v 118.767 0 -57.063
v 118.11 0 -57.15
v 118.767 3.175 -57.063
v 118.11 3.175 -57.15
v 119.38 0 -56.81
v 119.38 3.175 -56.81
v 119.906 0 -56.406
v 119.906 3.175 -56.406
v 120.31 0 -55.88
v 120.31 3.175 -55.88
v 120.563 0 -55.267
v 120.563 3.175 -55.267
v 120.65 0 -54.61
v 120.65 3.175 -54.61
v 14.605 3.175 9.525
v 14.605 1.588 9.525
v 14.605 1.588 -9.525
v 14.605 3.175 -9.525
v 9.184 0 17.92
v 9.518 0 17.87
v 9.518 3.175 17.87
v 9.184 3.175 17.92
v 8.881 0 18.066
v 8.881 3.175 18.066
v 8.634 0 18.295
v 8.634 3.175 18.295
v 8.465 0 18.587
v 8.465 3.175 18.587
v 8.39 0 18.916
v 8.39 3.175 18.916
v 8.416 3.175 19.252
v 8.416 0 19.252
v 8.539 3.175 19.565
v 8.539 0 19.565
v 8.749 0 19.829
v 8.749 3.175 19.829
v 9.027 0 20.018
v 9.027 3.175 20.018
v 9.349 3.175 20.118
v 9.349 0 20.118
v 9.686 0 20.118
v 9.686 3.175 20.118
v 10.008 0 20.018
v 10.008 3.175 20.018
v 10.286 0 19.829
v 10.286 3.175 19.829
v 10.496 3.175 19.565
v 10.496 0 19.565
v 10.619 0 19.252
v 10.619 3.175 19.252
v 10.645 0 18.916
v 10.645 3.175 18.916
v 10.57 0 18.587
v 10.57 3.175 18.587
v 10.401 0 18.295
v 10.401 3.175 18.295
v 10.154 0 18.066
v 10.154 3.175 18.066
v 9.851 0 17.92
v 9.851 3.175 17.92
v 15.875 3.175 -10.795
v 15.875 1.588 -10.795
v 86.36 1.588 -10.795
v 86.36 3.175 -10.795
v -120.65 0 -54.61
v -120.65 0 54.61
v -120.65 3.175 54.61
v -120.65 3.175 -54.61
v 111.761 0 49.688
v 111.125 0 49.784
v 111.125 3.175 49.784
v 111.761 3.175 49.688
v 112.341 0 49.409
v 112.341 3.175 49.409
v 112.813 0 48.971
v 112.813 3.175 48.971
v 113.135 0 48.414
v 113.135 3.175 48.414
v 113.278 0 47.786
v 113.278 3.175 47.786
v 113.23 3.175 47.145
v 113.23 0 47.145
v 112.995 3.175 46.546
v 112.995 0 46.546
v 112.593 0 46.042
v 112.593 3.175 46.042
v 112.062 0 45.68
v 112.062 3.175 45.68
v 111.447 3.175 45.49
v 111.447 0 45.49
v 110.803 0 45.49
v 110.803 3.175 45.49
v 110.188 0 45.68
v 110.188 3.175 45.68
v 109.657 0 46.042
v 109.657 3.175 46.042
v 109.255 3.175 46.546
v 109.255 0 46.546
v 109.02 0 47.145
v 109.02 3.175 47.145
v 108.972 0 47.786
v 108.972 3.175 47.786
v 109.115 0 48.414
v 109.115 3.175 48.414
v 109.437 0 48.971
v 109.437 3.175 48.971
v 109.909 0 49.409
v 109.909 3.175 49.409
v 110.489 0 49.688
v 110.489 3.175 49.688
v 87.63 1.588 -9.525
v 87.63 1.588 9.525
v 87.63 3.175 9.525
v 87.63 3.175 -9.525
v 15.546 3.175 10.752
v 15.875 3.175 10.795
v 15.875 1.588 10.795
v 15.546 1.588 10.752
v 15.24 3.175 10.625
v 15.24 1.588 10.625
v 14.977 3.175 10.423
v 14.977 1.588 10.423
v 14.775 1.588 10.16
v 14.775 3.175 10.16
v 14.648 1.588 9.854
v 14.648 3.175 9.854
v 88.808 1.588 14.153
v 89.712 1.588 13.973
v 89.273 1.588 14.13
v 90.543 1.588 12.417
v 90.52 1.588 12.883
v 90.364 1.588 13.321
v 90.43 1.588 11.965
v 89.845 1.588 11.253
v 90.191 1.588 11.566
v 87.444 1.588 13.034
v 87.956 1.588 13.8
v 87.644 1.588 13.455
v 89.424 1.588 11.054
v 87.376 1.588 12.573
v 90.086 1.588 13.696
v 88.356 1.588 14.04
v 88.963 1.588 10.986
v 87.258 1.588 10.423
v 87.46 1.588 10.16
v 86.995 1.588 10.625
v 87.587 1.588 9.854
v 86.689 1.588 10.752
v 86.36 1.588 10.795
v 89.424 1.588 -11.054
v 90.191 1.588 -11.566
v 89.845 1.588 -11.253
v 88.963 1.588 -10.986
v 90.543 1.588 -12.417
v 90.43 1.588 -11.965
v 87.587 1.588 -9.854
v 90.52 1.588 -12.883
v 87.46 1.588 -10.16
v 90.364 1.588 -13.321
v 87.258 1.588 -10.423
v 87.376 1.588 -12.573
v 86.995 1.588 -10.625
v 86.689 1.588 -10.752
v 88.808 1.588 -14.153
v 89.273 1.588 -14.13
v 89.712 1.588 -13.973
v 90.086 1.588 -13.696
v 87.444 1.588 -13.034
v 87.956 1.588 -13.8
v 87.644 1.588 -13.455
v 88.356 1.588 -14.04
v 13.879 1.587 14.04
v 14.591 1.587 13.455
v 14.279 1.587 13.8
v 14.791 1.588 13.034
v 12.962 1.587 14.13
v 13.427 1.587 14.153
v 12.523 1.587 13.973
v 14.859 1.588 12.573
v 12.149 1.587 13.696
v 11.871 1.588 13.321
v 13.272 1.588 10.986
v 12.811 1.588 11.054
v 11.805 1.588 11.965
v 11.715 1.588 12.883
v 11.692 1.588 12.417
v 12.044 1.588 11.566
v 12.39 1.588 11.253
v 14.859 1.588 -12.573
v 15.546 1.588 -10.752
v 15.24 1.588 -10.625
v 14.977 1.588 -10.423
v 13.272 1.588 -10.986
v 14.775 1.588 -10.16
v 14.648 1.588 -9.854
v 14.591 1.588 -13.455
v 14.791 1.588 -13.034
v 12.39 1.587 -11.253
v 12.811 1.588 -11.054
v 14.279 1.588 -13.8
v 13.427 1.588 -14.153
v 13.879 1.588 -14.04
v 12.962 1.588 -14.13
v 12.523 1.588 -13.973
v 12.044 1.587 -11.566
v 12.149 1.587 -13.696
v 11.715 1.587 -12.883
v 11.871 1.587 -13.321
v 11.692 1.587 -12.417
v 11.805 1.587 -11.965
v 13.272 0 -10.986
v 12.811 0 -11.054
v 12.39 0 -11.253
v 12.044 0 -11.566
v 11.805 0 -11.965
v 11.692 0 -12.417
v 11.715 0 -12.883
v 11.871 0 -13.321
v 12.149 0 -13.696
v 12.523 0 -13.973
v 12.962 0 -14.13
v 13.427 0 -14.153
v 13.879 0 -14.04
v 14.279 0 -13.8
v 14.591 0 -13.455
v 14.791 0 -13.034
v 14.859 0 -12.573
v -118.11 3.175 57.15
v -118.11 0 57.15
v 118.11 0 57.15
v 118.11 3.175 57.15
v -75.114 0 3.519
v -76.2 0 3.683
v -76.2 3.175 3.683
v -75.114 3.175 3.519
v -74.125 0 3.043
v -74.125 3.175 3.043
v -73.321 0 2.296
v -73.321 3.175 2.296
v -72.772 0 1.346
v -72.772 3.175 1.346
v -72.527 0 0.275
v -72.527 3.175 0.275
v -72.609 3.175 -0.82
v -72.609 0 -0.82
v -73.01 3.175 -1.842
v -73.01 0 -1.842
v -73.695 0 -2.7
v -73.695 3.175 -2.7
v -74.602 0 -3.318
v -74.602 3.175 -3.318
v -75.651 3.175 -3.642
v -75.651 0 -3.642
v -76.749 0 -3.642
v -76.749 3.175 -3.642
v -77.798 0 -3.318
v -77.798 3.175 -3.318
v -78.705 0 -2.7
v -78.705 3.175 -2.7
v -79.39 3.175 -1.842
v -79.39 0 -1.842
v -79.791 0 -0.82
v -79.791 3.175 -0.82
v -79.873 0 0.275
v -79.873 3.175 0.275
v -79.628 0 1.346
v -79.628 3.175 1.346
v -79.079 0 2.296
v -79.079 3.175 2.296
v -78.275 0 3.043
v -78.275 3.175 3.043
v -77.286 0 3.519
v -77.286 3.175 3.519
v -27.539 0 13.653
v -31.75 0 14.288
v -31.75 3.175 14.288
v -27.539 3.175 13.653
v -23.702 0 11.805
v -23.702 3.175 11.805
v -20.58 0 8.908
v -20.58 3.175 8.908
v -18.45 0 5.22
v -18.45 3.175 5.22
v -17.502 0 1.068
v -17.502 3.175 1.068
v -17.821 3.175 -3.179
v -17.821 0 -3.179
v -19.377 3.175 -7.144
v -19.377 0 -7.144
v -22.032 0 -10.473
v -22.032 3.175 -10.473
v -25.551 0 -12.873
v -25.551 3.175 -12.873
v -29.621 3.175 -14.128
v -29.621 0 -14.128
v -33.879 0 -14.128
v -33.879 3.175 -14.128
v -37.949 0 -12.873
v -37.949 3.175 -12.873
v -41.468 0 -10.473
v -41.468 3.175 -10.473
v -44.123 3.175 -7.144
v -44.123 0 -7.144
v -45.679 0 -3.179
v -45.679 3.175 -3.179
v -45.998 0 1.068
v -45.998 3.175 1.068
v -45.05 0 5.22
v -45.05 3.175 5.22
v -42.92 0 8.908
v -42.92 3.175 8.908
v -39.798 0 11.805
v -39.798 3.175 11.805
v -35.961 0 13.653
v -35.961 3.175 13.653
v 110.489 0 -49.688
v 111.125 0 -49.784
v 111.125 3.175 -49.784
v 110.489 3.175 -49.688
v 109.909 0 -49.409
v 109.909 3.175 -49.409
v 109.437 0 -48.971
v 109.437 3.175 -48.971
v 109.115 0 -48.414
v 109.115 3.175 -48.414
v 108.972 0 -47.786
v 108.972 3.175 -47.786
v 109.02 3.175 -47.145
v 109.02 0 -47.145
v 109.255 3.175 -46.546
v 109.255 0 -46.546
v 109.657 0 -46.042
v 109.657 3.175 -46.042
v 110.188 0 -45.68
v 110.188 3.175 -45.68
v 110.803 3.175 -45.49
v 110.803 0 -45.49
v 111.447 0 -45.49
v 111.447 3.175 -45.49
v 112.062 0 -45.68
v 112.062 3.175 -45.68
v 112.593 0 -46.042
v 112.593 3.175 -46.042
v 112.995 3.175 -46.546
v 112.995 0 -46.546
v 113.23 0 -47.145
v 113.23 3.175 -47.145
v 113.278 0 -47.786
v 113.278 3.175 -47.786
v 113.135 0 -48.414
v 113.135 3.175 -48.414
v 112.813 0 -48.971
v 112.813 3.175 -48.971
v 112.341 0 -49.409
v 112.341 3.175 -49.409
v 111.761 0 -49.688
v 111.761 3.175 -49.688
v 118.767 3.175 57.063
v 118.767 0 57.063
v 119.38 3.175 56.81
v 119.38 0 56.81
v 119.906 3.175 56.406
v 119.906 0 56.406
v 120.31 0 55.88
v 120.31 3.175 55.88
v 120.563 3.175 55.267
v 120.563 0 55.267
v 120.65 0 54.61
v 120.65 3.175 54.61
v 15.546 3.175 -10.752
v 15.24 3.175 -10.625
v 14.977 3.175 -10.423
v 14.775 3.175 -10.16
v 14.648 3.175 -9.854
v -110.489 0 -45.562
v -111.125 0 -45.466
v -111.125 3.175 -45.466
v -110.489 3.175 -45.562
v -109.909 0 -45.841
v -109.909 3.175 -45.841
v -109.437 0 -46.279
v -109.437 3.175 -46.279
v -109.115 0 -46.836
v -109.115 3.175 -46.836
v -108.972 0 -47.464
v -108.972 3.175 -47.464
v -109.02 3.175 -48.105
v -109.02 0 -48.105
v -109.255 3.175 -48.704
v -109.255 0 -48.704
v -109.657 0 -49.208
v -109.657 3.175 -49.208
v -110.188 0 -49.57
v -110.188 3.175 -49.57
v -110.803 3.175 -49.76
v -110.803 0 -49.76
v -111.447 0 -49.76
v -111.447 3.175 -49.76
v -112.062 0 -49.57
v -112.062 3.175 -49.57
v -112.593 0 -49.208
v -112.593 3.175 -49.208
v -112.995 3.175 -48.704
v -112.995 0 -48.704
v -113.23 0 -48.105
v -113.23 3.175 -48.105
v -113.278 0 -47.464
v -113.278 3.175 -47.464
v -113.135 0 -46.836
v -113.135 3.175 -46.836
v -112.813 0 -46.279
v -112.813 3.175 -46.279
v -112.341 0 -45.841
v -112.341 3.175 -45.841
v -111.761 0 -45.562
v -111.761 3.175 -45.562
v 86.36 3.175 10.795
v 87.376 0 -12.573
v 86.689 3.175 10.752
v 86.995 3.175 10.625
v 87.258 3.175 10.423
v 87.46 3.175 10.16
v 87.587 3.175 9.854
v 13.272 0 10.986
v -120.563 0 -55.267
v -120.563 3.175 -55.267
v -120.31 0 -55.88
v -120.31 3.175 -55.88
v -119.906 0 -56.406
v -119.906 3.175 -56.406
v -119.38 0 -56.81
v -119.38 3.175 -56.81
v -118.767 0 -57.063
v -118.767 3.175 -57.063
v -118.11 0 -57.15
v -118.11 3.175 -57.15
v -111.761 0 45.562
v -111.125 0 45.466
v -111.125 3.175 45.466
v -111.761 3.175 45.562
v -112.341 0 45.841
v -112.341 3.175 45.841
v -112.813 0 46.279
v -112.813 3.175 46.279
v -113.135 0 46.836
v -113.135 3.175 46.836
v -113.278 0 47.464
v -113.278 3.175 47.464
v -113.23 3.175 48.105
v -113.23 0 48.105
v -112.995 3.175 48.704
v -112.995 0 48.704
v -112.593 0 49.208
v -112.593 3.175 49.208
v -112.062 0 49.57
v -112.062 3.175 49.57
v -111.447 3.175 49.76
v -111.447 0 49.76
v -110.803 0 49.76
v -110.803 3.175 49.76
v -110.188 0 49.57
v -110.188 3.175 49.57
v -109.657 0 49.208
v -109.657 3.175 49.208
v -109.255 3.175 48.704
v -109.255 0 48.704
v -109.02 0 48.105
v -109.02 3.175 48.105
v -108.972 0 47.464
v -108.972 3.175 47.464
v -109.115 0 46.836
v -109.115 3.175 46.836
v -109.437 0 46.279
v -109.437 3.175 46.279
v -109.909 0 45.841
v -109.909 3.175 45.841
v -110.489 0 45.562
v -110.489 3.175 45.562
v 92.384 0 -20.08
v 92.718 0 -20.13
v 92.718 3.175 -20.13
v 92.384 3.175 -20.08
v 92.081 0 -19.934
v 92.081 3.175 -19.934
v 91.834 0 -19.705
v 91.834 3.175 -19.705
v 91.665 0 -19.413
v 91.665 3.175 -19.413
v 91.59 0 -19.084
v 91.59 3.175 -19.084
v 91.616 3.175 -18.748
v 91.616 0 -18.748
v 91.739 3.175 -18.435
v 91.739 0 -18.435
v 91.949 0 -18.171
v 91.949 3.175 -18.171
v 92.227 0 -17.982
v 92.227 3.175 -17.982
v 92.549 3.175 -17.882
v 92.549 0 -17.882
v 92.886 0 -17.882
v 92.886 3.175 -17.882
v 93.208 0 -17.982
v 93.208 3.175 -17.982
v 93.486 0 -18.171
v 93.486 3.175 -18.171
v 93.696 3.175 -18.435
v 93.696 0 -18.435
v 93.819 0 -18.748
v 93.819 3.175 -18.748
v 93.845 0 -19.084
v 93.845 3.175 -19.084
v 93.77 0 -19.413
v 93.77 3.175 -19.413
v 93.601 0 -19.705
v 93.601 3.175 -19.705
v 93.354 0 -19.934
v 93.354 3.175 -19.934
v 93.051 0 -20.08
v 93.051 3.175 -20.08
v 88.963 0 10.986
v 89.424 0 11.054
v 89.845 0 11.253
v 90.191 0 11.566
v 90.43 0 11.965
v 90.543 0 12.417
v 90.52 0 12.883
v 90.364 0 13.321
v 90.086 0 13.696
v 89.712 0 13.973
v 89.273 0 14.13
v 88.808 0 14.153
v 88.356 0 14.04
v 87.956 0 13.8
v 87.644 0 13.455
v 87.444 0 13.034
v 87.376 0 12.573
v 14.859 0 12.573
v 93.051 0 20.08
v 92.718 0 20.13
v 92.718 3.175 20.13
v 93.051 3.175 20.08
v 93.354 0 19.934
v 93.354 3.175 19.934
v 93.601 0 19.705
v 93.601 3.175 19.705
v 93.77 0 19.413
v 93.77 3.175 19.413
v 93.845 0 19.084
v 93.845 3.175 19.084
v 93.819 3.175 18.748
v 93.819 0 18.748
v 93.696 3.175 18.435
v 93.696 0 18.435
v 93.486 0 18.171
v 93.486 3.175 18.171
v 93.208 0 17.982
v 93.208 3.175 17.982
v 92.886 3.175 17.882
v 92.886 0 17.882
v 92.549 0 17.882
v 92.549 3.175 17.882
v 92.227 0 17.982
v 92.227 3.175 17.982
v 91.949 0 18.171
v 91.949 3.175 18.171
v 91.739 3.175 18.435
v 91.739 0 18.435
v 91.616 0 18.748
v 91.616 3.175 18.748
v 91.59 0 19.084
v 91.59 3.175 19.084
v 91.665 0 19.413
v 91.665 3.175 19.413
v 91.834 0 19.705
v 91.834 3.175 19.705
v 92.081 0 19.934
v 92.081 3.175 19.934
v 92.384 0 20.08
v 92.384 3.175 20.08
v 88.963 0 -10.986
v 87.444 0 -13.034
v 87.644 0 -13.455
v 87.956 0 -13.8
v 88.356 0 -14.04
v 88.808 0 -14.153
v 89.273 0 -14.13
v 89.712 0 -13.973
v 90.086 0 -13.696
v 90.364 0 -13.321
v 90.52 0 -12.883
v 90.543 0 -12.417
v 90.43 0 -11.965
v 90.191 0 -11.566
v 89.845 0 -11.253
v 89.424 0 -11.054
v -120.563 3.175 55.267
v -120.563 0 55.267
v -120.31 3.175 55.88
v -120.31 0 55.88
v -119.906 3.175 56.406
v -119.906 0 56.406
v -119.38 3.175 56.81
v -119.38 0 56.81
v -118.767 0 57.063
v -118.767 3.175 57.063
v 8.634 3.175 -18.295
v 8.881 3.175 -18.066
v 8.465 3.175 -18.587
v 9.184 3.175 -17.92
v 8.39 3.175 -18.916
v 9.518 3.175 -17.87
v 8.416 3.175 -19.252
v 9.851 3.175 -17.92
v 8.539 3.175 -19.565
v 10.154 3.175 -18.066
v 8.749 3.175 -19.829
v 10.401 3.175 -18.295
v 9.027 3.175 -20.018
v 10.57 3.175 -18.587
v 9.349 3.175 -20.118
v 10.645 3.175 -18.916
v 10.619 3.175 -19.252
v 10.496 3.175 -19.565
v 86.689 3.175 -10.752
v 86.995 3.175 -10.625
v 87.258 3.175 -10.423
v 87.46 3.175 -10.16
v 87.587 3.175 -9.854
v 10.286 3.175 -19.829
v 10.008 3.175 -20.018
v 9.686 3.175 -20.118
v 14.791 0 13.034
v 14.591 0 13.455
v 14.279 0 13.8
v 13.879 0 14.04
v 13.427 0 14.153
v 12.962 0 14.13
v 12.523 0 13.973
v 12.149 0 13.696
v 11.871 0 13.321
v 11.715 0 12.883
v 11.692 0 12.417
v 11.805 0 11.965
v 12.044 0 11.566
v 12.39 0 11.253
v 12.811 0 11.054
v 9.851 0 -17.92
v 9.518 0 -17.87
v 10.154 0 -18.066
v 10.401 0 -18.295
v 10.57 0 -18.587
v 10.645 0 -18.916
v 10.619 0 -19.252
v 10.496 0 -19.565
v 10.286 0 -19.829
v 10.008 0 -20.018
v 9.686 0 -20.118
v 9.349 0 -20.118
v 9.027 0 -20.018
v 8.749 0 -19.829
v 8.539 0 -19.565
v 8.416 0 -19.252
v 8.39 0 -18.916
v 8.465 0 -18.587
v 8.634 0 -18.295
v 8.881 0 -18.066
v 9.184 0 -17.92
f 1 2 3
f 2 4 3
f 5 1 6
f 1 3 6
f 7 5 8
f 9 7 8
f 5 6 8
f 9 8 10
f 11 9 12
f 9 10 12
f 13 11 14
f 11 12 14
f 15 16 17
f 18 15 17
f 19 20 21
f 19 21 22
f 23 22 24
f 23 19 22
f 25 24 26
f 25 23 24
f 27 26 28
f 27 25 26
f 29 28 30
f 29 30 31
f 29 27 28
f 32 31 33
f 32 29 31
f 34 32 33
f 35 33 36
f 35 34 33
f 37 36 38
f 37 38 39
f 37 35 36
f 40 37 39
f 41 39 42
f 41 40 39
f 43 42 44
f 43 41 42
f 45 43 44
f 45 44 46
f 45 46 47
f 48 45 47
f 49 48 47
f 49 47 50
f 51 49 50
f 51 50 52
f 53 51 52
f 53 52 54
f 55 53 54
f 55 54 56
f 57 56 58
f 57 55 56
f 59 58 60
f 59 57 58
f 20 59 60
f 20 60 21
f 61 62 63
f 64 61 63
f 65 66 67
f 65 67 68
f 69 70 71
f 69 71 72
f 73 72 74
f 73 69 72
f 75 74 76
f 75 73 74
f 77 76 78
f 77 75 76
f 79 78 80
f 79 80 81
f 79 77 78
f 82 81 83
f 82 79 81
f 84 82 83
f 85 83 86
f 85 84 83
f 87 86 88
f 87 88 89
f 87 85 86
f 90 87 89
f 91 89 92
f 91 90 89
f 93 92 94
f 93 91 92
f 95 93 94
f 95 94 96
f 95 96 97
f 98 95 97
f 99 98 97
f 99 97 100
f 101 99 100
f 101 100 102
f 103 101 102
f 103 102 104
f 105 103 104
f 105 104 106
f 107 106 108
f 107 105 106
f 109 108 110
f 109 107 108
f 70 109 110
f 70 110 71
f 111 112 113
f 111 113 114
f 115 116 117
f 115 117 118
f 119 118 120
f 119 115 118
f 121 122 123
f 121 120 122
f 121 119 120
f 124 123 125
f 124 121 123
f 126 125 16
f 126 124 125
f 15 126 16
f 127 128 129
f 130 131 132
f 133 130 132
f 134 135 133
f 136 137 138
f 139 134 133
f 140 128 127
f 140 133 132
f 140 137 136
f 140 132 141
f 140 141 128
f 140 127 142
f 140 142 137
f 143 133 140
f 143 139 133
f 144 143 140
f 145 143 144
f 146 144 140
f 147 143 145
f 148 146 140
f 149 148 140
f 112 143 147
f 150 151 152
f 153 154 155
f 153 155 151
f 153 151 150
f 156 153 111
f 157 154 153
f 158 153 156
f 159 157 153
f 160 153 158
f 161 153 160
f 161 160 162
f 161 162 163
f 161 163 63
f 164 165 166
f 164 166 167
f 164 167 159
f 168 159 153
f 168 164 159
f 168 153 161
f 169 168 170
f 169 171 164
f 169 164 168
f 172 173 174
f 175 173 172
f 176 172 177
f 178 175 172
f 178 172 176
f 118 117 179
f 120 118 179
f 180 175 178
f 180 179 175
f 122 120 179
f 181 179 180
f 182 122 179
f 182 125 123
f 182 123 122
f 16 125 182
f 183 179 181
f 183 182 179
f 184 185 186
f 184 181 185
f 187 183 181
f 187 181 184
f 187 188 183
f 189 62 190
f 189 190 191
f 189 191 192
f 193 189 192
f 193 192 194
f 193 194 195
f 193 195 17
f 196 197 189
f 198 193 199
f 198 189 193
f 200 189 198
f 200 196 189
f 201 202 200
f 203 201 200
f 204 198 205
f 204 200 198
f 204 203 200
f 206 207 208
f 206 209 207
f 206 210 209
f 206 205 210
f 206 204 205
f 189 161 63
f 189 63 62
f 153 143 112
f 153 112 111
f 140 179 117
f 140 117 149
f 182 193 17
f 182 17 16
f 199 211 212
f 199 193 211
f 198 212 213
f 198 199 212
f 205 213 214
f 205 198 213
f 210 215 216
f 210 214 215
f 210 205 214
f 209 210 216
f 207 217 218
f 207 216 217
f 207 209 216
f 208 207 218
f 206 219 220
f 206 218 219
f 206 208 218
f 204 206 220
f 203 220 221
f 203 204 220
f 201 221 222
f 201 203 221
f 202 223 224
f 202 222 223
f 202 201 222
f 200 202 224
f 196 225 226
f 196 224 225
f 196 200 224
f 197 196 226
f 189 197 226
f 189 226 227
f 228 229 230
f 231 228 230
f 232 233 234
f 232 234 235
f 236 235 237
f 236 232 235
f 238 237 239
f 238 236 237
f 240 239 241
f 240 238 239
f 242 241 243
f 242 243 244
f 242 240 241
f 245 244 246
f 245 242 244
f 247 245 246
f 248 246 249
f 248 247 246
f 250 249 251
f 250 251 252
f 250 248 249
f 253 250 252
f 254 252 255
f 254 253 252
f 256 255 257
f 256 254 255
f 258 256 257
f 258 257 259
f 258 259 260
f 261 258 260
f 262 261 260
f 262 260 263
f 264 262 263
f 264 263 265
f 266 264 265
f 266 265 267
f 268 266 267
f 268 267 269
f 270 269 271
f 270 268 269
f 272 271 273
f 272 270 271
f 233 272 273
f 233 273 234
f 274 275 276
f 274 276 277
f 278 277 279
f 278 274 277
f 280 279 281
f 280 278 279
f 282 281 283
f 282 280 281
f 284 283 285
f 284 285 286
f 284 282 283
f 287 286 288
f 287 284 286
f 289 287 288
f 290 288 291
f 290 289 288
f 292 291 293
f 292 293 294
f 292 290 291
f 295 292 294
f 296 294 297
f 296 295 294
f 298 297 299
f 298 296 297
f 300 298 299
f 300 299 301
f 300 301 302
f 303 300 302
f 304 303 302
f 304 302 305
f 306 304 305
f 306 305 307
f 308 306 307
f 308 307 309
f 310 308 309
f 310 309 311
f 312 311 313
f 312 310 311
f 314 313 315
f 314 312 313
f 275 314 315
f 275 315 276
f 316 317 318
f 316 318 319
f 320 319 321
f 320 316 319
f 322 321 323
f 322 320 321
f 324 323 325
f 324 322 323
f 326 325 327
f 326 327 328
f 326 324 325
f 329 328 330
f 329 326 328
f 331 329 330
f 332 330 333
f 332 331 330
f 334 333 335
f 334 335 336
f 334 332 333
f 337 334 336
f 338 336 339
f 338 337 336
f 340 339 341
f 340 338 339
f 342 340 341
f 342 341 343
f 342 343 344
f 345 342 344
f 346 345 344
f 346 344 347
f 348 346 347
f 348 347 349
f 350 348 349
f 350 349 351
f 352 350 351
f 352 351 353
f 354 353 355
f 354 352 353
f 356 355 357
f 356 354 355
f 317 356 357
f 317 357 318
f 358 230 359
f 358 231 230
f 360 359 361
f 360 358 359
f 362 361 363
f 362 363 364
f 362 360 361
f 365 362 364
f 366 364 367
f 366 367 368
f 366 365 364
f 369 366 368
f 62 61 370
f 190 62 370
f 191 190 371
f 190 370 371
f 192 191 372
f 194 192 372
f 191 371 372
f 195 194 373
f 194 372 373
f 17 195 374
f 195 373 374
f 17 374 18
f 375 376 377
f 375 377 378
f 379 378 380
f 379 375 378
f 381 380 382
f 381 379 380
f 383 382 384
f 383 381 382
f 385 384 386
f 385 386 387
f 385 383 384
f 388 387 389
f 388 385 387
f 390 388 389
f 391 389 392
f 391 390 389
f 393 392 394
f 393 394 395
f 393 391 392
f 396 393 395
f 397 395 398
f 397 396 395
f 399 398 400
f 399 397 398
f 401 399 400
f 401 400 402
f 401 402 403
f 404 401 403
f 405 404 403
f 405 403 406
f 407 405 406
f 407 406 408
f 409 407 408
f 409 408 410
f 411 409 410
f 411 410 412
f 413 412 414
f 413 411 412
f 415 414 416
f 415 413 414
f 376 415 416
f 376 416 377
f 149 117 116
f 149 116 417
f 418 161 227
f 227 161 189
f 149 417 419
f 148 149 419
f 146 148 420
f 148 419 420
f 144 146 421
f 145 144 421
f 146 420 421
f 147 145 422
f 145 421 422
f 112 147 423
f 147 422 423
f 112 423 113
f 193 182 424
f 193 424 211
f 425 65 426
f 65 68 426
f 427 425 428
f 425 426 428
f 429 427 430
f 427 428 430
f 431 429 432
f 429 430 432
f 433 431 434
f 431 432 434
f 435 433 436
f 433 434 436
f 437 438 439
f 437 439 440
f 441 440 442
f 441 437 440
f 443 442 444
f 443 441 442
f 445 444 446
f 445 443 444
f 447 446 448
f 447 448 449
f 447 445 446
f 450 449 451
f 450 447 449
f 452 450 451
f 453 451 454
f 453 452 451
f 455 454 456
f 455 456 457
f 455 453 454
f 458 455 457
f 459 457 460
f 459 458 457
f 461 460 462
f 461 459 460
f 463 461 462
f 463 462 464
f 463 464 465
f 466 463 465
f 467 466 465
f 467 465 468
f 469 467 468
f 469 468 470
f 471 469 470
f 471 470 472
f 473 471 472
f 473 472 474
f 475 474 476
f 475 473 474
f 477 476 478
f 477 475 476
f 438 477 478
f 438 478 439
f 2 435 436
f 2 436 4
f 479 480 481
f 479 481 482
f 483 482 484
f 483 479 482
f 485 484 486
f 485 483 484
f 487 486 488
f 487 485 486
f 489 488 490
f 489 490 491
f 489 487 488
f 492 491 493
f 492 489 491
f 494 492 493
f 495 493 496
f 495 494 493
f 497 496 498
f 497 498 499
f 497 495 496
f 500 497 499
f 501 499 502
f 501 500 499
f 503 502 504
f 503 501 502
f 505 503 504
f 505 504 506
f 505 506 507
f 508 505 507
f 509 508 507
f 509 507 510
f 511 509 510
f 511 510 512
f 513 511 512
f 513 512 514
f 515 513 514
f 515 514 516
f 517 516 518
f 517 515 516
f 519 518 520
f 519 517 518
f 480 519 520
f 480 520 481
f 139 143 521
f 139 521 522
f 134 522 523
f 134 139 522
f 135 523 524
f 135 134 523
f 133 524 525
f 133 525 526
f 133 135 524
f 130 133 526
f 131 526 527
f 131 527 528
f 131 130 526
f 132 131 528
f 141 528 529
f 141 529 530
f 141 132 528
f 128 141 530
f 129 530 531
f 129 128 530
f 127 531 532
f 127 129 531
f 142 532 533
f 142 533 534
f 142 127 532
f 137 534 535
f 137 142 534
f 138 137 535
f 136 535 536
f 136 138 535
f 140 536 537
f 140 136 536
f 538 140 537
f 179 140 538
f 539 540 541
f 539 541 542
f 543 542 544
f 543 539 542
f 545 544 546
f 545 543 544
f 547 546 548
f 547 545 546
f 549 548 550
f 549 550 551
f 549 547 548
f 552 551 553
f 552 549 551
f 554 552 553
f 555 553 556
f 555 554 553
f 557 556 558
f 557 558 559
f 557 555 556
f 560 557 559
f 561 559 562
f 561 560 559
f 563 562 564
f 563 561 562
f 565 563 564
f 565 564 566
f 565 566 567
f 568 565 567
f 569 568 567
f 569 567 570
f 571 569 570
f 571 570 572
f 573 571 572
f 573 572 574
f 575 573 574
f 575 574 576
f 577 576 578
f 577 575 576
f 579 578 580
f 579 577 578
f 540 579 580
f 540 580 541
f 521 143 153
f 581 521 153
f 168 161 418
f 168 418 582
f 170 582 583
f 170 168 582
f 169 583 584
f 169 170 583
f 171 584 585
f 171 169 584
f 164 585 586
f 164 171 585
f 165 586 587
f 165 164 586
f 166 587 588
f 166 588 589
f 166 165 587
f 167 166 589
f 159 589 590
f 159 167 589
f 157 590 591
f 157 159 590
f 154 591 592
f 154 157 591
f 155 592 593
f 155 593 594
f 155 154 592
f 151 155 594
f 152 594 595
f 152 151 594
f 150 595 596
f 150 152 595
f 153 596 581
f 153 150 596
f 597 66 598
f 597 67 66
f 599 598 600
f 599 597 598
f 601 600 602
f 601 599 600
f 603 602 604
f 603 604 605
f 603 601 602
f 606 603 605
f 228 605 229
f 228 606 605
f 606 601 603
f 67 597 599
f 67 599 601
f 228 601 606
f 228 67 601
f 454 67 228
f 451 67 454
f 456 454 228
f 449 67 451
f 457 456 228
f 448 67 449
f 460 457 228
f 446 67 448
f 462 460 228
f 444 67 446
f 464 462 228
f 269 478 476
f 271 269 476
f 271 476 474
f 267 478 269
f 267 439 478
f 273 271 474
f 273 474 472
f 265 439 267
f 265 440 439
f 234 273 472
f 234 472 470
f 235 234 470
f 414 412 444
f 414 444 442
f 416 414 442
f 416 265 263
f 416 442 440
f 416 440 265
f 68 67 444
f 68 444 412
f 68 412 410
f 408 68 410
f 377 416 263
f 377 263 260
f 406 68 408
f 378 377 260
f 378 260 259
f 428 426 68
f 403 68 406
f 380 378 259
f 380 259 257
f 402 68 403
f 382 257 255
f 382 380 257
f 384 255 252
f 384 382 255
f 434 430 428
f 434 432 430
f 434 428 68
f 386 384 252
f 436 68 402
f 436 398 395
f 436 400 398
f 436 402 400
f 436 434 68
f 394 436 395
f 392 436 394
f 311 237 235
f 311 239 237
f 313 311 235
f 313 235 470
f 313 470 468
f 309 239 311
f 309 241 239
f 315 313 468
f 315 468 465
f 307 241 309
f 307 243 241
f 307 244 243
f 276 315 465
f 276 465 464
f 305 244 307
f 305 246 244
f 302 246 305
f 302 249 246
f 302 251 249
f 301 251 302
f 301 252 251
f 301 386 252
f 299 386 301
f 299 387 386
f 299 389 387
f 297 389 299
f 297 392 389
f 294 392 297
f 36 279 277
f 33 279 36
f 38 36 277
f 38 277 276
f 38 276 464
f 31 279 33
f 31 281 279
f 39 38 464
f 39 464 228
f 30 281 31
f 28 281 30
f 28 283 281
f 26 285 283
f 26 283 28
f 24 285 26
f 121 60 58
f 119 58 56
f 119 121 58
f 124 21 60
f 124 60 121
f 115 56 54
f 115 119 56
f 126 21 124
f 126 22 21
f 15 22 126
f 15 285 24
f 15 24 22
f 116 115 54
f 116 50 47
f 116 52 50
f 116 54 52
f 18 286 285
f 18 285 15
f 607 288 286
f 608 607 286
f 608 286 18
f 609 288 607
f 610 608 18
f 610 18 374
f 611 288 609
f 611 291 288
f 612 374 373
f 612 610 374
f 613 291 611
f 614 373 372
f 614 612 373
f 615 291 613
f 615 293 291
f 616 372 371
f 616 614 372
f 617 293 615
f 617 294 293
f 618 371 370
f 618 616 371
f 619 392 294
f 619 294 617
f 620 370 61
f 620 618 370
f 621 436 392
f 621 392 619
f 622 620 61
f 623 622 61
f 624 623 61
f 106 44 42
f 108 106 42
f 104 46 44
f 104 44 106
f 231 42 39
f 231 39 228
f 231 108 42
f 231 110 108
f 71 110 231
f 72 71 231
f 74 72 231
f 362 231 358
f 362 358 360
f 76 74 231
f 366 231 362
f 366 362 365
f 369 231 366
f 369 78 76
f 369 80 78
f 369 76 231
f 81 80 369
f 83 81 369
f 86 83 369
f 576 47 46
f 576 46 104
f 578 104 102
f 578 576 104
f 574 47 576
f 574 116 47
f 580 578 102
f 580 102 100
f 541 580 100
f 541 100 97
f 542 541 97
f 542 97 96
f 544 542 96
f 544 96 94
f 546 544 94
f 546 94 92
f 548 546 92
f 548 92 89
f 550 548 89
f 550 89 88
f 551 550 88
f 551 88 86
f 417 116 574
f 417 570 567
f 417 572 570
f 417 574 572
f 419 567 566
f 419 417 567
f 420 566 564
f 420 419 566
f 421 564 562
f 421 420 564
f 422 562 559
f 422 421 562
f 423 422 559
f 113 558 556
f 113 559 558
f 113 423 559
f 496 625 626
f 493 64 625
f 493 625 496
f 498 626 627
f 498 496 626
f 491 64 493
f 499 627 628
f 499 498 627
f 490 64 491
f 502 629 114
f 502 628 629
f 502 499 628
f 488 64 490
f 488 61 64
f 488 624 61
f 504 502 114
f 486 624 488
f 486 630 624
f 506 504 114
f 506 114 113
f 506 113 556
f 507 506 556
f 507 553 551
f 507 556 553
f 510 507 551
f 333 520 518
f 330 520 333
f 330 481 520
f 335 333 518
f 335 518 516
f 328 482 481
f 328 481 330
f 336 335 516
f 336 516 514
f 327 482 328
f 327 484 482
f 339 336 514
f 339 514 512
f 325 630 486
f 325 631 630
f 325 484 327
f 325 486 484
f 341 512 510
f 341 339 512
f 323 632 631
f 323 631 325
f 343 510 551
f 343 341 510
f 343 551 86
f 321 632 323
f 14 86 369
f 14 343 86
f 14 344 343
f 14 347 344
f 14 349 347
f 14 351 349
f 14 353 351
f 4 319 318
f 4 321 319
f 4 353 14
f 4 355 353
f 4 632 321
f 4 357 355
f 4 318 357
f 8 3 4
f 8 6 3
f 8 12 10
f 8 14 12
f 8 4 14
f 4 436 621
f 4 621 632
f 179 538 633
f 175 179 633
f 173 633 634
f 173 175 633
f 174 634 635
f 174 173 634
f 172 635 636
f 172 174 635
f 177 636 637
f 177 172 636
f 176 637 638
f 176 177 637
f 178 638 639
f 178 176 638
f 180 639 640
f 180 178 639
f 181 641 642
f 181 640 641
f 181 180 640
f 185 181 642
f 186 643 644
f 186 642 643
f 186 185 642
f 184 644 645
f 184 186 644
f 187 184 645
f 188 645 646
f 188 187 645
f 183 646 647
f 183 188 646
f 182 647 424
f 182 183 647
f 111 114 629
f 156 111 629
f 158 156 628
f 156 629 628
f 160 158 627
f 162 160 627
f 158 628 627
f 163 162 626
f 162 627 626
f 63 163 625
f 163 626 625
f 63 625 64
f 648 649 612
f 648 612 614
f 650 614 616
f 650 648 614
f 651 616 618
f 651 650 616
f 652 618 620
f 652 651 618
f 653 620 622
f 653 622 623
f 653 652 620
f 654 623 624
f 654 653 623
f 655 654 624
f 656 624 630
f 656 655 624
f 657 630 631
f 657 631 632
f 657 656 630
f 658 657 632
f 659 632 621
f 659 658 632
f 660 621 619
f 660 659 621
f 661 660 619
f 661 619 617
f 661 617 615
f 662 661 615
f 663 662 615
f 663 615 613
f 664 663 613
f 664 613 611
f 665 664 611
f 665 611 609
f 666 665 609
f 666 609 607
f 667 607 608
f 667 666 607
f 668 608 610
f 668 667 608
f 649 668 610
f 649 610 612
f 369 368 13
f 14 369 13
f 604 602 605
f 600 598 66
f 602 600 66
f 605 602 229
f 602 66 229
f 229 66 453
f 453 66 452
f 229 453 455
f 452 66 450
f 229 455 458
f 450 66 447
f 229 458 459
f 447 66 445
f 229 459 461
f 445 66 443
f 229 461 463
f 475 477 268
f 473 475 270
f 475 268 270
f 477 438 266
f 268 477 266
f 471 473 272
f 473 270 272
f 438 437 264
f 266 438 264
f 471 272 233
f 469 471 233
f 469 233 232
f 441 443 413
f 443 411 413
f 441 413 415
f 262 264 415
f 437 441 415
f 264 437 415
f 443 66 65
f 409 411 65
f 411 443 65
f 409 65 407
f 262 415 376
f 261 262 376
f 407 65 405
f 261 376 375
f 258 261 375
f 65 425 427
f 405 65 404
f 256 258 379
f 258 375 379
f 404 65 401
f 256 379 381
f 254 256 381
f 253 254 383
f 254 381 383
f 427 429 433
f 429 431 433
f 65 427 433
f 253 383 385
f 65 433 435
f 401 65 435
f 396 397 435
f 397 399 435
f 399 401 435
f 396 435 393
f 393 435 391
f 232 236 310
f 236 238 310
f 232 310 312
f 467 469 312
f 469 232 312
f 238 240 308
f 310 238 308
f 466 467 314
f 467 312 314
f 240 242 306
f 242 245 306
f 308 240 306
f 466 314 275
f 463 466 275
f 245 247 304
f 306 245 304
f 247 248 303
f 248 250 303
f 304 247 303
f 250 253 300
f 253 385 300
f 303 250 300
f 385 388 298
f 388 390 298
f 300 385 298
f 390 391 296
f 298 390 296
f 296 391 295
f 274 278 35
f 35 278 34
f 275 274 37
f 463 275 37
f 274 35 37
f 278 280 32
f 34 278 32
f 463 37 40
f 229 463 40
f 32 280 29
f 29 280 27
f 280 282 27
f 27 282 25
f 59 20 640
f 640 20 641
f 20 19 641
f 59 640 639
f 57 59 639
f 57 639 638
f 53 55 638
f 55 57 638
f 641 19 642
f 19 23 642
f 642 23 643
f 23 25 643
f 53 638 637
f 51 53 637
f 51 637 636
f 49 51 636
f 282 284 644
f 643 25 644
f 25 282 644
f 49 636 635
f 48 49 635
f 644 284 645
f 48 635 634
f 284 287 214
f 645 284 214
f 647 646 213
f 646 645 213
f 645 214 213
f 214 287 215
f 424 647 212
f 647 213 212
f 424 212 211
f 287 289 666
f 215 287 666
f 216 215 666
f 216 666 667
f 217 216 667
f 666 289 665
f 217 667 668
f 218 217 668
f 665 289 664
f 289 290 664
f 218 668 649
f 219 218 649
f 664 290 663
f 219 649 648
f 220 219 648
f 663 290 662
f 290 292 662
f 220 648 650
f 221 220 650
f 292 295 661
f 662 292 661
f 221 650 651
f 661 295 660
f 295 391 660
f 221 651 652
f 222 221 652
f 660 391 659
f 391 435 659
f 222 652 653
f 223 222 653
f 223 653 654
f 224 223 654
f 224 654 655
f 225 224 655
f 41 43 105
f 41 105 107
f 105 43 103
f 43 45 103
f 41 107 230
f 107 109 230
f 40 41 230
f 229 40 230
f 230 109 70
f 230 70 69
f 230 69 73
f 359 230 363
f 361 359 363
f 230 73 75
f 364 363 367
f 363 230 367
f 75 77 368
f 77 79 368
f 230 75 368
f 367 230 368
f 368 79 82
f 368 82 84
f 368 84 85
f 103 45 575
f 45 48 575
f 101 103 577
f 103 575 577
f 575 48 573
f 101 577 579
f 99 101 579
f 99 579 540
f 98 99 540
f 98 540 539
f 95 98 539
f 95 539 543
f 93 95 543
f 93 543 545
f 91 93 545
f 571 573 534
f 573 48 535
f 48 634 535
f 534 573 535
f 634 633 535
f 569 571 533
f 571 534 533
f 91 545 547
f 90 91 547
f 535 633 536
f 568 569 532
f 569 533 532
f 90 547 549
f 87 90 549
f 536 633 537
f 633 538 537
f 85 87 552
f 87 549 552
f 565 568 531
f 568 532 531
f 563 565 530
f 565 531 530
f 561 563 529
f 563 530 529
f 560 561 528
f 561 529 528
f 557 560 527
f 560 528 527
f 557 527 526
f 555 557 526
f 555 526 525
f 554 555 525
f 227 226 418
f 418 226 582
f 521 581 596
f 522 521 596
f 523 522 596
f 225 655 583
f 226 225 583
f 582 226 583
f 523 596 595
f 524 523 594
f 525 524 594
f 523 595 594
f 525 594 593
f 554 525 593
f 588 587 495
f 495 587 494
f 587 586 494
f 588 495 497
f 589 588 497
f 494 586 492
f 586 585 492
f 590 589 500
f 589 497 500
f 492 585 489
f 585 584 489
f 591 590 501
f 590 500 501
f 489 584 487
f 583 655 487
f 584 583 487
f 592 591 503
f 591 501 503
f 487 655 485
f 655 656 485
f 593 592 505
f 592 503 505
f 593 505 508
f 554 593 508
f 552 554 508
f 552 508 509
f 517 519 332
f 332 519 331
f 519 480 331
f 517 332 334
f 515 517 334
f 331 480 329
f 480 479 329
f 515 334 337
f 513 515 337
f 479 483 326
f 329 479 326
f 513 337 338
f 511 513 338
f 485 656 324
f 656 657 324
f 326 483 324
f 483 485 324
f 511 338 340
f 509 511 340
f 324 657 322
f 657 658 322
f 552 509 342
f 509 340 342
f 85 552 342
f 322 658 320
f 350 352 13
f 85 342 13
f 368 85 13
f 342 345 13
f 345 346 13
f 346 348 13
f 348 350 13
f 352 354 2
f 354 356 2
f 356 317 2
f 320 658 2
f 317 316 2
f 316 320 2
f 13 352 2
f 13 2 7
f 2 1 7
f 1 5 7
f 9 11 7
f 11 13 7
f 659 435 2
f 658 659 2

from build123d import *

# Parameters (mm, degrees)
SKETCH1_W           = 241.3
SKETCH1_H           = 114.3
SKETCH1_R           = 2.159
SKETCH1_R_2         = 3.683
SKETCH1_R_3         = 14.2875
SKETCH1_R_4         = 1.1303
SKETCH1_W_2         = 73.025
SKETCH1_H_2         = 21.59
BOSS_EXTRUDE1_DEPTH = 3.175
FILLET1_R           = 1.27
FILLET2_R           = 2.54
CUT_EXTRUDE1_START  = -1.5875
SKETCH2_R           = 1.5875
SKETCH2_W           = 75.692
SKETCH2_H           = 25.146
CUT_EXTRUDE1_DEPTH  = 1.5875


with BuildPart() as part:
    # Sketch1 → Boss-Extrude1 (new body)
    with BuildSketch(Plane(origin=(0, 0, 0), x_dir=(1, 0, 0), z_dir=(0, 1, 0))):
        Rectangle(SKETCH1_W, SKETCH1_H)
        with Locations(Location((-111.125, 47.625, 0), (0, 0, 270))):
            Circle(SKETCH1_R, mode=Mode.SUBTRACT)
        with Locations(Location((111.125, 47.625, 0), (0, 0, 90))):
            Circle(SKETCH1_R, mode=Mode.SUBTRACT)
        with Locations(Location((111.125, -47.625, 0), (0, 0, 270))):
            Circle(SKETCH1_R, mode=Mode.SUBTRACT)
        with Locations(Location((-111.125, -47.625, 0), (0, 0, 90))):
            Circle(SKETCH1_R, mode=Mode.SUBTRACT)
        with Locations(Location((-76.2, 0, 0), (0, 0, 270))):
            Circle(SKETCH1_R_2, mode=Mode.SUBTRACT)
        with Locations(Location((-31.75, 0, 0), (0, 0, 270))):
            Circle(SKETCH1_R_3, mode=Mode.SUBTRACT)
        with Locations(Location((9.5175, 19, 0), (0, 0, 270))):
            Circle(SKETCH1_R_4, mode=Mode.SUBTRACT)
        with Locations(Location((9.5175, -19, 0), (0, 0, 90))):
            Circle(SKETCH1_R_4, mode=Mode.SUBTRACT)
        with Locations(Location((92.7175, -19, 0), (0, 0, 270))):
            Circle(SKETCH1_R_4, mode=Mode.SUBTRACT)
        with Locations(Location((92.7175, 19, 0), (0, 0, 90))):
            Circle(SKETCH1_R_4, mode=Mode.SUBTRACT)
        with Locations((51.1175, 0)):
            Rectangle(SKETCH1_W_2, SKETCH1_H_2, mode=Mode.SUBTRACT)
    extrude(amount=BOSS_EXTRUDE1_DEPTH)

    # Fillet1
    fillet1_edges = [part.edges().sort_by_distance(p)[0] for p in [
        (87.63, 1.5875, 10.795),
        (87.63, 1.5875, -10.795),
        (14.605, 1.5875, -10.795),
        (14.605, 1.5875, 10.795),
    ]]
    fillet(fillet1_edges, radius=FILLET1_R)

    # Fillet2
    fillet2_edges = [part.edges().sort_by_distance(p)[0] for p in [
        (120.65, 1.5875, 57.15),
        (-120.65, 1.5875, 57.15),
        (-120.65, 1.5875, -57.15),
        (120.65, 1.5875, -57.15),
    ]]
    fillet(fillet2_edges, radius=FILLET2_R)

    # Sketch2 → Cut-Extrude1 (cut)
    # profile 1 of 21: a face of its own
    with BuildSketch(Plane(origin=(0, 0, 0), x_dir=(-1, 0, 0), z_dir=(0, -1, 0)).offset(CUT_EXTRUDE1_START)):
        with Locations((-13.2715, 12.573)):
            Circle(SKETCH2_R)
    # profile 2 of 21: a face of its own
    with BuildSketch(Plane(origin=(0, 0, 0), x_dir=(-1, 0, 0), z_dir=(0, -1, 0)).offset(CUT_EXTRUDE1_START)):
        with Locations((-88.9635, 12.573)):
            Circle(SKETCH2_R)
    # profile 3 of 21: a face of its own
    with BuildSketch(Plane(origin=(0, 0, 0), x_dir=(-1, 0, 0), z_dir=(0, -1, 0)).offset(CUT_EXTRUDE1_START)):
        with Locations((-88.9635, -12.573)):
            Circle(SKETCH2_R)
    # profile 4 of 21: a face of its own
    with BuildSketch(Plane(origin=(0, 0, 0), x_dir=(-1, 0, 0), z_dir=(0, -1, 0)).offset(CUT_EXTRUDE1_START)):
        with Locations((-13.2715, -12.573)):
            Circle(SKETCH2_R)
    # profile 5 of 21: a face of its own
    with BuildSketch(Plane(origin=(0, 0, 0), x_dir=(-1, 0, 0), z_dir=(0, -1, 0)).offset(CUT_EXTRUDE1_START)):
        with Locations((-51.1175, 0)):
            Rectangle(SKETCH2_W, SKETCH2_H)
        with BuildLine():
            ThreePointArc((-15.875, 10.795), (-14.976974388, 10.423025612), (-14.605, 9.525))
            Line((-14.605, 9.525), (-14.605, -9.525))
            ThreePointArc((-14.605, -9.525), (-14.976974388, -10.423025612), (-15.875, -10.795))
            Line((-15.875, -10.795), (-86.36, -10.795))
            ThreePointArc((-86.36, -10.795), (-87.258025612, -10.423025612), (-87.63, -9.525))
            Line((-87.63, -9.525), (-87.63, 9.525))
            ThreePointArc((-87.63, 9.525), (-87.258025612, 10.423025612), (-86.36, 10.795))
            Line((-86.36, 10.795), (-15.875, 10.795))
        make_face(mode=Mode.SUBTRACT)
    # profile 6 of 21: a face of its own
    with BuildSketch(Plane(origin=(0, 0, 0), x_dir=(-1, 0, 0), z_dir=(0, -1, 0)).offset(CUT_EXTRUDE1_START)):
        with BuildLine():
            Line((-88.9635, -10.9855), (-88.9635, -12.573))
            Line((-88.9635, -12.573), (-87.376, -12.573))
            ThreePointArc((-87.376, -12.573), (-87.840967985, -11.450467985), (-88.9635, -10.9855))
        make_face()
    # profile 7 of 21: a face of its own
    with BuildSketch(Plane(origin=(0, 0, 0), x_dir=(-1, 0, 0), z_dir=(0, -1, 0)).offset(CUT_EXTRUDE1_START)):
        with BuildLine():
            Line((-87.376, -12.573), (-88.9635, -12.573))
            Line((-88.9635, -12.573), (-88.9635, -10.9855))
            ThreePointArc((-88.9635, -10.9855), (-90.086032015, -13.695532015), (-87.376, -12.573))
        make_face()
    # profile 8 of 21: a face of its own
    with BuildSketch(Plane(origin=(0, 0, 0), x_dir=(-1, 0, 0), z_dir=(0, -1, 0)).offset(CUT_EXTRUDE1_START)):
        with BuildLine():
            Line((-88.9635, -10.9855), (-88.9635, -12.573))
            Line((-88.9635, -12.573), (-87.376, -12.573))
            ThreePointArc((-87.376, -12.573), (-87.840967985, -11.450467985), (-88.9635, -10.9855))
        make_face()
    # profile 9 of 21: a face of its own
    with BuildSketch(Plane(origin=(0, 0, 0), x_dir=(-1, 0, 0), z_dir=(0, -1, 0)).offset(CUT_EXTRUDE1_START)):
        with BuildLine():
            Line((-87.376, -12.573), (-88.9635, -12.573))
            Line((-88.9635, -12.573), (-88.9635, -10.9855))
            ThreePointArc((-88.9635, -10.9855), (-90.086032015, -13.695532015), (-87.376, -12.573))
        make_face()
    # profile 10 of 21: a face of its own
    with BuildSketch(Plane(origin=(0, 0, 0), x_dir=(-1, 0, 0), z_dir=(0, -1, 0)).offset(CUT_EXTRUDE1_START)):
        with BuildLine():
            ThreePointArc((-87.376, 12.573), (-90.086032015, 13.695532015), (-88.9635, 10.9855))
            Line((-88.9635, 10.9855), (-88.9635, 12.573))
            Line((-88.9635, 12.573), (-87.376, 12.573))
        make_face()
    # profile 11 of 21: a face of its own
    with BuildSketch(Plane(origin=(0, 0, 0), x_dir=(-1, 0, 0), z_dir=(0, -1, 0)).offset(CUT_EXTRUDE1_START)):
        with BuildLine():
            Line((-88.9635, 12.573), (-88.9635, 10.9855))
            ThreePointArc((-88.9635, 10.9855), (-87.840967985, 11.450467985), (-87.376, 12.573))
            Line((-87.376, 12.573), (-88.9635, 12.573))
        make_face()
    # profile 12 of 21: a face of its own
    with BuildSketch(Plane(origin=(0, 0, 0), x_dir=(-1, 0, 0), z_dir=(0, -1, 0)).offset(CUT_EXTRUDE1_START)):
        with BuildLine():
            ThreePointArc((-87.376, 12.573), (-90.086032015, 13.695532015), (-88.9635, 10.9855))
            Line((-88.9635, 10.9855), (-88.9635, 12.573))
            Line((-88.9635, 12.573), (-87.376, 12.573))
        make_face()
    # profile 13 of 21: a face of its own
    with BuildSketch(Plane(origin=(0, 0, 0), x_dir=(-1, 0, 0), z_dir=(0, -1, 0)).offset(CUT_EXTRUDE1_START)):
        with BuildLine():
            Line((-88.9635, 12.573), (-88.9635, 10.9855))
            ThreePointArc((-88.9635, 10.9855), (-87.840967985, 11.450467985), (-87.376, 12.573))
            Line((-87.376, 12.573), (-88.9635, 12.573))
        make_face()
    # profile 14 of 21: a face of its own
    with BuildSketch(Plane(origin=(0, 0, 0), x_dir=(-1, 0, 0), z_dir=(0, -1, 0)).offset(CUT_EXTRUDE1_START)):
        with BuildLine():
            ThreePointArc((-14.859, 12.573), (-14.394032015, 11.450467985), (-13.2715, 10.9855))
            Line((-13.2715, 10.9855), (-13.2715, 12.573))
            Line((-13.2715, 12.573), (-14.859, 12.573))
        make_face()
    # profile 15 of 21: a face of its own
    with BuildSketch(Plane(origin=(0, 0, 0), x_dir=(-1, 0, 0), z_dir=(0, -1, 0)).offset(CUT_EXTRUDE1_START)):
        with BuildLine():
            Line((-13.2715, 12.573), (-13.2715, 10.9855))
            ThreePointArc((-13.2715, 10.9855), (-12.148967985, 11.450467985), (-11.684, 12.573))
            ThreePointArc((-11.684, 12.573), (-13.2715, 14.1605), (-14.859, 12.573))
            Line((-14.859, 12.573), (-13.2715, 12.573))
        make_face()
    # profile 16 of 21: a face of its own
    with BuildSketch(Plane(origin=(0, 0, 0), x_dir=(-1, 0, 0), z_dir=(0, -1, 0)).offset(CUT_EXTRUDE1_START)):
        with BuildLine():
            ThreePointArc((-14.859, 12.573), (-14.394032015, 11.450467985), (-13.2715, 10.9855))
            Line((-13.2715, 10.9855), (-13.2715, 12.573))
            Line((-13.2715, 12.573), (-14.859, 12.573))
        make_face()
    # profile 17 of 21: a face of its own
    with BuildSketch(Plane(origin=(0, 0, 0), x_dir=(-1, 0, 0), z_dir=(0, -1, 0)).offset(CUT_EXTRUDE1_START)):
        with BuildLine():
            Line((-13.2715, 12.573), (-13.2715, 10.9855))
            ThreePointArc((-13.2715, 10.9855), (-12.148967985, 11.450467985), (-11.684, 12.573))
            ThreePointArc((-11.684, 12.573), (-13.2715, 14.1605), (-14.859, 12.573))
            Line((-14.859, 12.573), (-13.2715, 12.573))
        make_face()
    # profile 18 of 21: a face of its own
    with BuildSketch(Plane(origin=(0, 0, 0), x_dir=(-1, 0, 0), z_dir=(0, -1, 0)).offset(CUT_EXTRUDE1_START)):
        with BuildLine():
            ThreePointArc((-13.2715, -10.9855), (-14.394032015, -11.450467985), (-14.859, -12.573))
            Line((-14.859, -12.573), (-13.2715, -12.573))
            Line((-13.2715, -12.573), (-13.2715, -10.9855))
        make_face()
    # profile 19 of 21: a face of its own
    with BuildSketch(Plane(origin=(0, 0, 0), x_dir=(-1, 0, 0), z_dir=(0, -1, 0)).offset(CUT_EXTRUDE1_START)):
        with BuildLine():
            Line((-13.2715, -12.573), (-14.859, -12.573))
            ThreePointArc((-14.859, -12.573), (-13.2715, -14.1605), (-11.684, -12.573))
            ThreePointArc((-11.684, -12.573), (-12.148967985, -11.450467985), (-13.2715, -10.9855))
            Line((-13.2715, -10.9855), (-13.2715, -12.573))
        make_face()
    # profile 20 of 21: a face of its own
    with BuildSketch(Plane(origin=(0, 0, 0), x_dir=(-1, 0, 0), z_dir=(0, -1, 0)).offset(CUT_EXTRUDE1_START)):
        with BuildLine():
            ThreePointArc((-13.2715, -10.9855), (-14.394032015, -11.450467985), (-14.859, -12.573))
            Line((-14.859, -12.573), (-13.2715, -12.573))
            Line((-13.2715, -12.573), (-13.2715, -10.9855))
        make_face()
    # profile 21 of 21: a face of its own
    with BuildSketch(Plane(origin=(0, 0, 0), x_dir=(-1, 0, 0), z_dir=(0, -1, 0)).offset(CUT_EXTRUDE1_START)):
        with BuildLine():
            Line((-13.2715, -12.573), (-14.859, -12.573))
            ThreePointArc((-14.859, -12.573), (-13.2715, -14.1605), (-11.684, -12.573))
            ThreePointArc((-11.684, -12.573), (-12.148967985, -11.450467985), (-13.2715, -10.9855))
            Line((-13.2715, -10.9855), (-13.2715, -12.573))
        make_face()
    extrude(amount=CUT_EXTRUDE1_DEPTH, mode=Mode.SUBTRACT)


solid = part.part
